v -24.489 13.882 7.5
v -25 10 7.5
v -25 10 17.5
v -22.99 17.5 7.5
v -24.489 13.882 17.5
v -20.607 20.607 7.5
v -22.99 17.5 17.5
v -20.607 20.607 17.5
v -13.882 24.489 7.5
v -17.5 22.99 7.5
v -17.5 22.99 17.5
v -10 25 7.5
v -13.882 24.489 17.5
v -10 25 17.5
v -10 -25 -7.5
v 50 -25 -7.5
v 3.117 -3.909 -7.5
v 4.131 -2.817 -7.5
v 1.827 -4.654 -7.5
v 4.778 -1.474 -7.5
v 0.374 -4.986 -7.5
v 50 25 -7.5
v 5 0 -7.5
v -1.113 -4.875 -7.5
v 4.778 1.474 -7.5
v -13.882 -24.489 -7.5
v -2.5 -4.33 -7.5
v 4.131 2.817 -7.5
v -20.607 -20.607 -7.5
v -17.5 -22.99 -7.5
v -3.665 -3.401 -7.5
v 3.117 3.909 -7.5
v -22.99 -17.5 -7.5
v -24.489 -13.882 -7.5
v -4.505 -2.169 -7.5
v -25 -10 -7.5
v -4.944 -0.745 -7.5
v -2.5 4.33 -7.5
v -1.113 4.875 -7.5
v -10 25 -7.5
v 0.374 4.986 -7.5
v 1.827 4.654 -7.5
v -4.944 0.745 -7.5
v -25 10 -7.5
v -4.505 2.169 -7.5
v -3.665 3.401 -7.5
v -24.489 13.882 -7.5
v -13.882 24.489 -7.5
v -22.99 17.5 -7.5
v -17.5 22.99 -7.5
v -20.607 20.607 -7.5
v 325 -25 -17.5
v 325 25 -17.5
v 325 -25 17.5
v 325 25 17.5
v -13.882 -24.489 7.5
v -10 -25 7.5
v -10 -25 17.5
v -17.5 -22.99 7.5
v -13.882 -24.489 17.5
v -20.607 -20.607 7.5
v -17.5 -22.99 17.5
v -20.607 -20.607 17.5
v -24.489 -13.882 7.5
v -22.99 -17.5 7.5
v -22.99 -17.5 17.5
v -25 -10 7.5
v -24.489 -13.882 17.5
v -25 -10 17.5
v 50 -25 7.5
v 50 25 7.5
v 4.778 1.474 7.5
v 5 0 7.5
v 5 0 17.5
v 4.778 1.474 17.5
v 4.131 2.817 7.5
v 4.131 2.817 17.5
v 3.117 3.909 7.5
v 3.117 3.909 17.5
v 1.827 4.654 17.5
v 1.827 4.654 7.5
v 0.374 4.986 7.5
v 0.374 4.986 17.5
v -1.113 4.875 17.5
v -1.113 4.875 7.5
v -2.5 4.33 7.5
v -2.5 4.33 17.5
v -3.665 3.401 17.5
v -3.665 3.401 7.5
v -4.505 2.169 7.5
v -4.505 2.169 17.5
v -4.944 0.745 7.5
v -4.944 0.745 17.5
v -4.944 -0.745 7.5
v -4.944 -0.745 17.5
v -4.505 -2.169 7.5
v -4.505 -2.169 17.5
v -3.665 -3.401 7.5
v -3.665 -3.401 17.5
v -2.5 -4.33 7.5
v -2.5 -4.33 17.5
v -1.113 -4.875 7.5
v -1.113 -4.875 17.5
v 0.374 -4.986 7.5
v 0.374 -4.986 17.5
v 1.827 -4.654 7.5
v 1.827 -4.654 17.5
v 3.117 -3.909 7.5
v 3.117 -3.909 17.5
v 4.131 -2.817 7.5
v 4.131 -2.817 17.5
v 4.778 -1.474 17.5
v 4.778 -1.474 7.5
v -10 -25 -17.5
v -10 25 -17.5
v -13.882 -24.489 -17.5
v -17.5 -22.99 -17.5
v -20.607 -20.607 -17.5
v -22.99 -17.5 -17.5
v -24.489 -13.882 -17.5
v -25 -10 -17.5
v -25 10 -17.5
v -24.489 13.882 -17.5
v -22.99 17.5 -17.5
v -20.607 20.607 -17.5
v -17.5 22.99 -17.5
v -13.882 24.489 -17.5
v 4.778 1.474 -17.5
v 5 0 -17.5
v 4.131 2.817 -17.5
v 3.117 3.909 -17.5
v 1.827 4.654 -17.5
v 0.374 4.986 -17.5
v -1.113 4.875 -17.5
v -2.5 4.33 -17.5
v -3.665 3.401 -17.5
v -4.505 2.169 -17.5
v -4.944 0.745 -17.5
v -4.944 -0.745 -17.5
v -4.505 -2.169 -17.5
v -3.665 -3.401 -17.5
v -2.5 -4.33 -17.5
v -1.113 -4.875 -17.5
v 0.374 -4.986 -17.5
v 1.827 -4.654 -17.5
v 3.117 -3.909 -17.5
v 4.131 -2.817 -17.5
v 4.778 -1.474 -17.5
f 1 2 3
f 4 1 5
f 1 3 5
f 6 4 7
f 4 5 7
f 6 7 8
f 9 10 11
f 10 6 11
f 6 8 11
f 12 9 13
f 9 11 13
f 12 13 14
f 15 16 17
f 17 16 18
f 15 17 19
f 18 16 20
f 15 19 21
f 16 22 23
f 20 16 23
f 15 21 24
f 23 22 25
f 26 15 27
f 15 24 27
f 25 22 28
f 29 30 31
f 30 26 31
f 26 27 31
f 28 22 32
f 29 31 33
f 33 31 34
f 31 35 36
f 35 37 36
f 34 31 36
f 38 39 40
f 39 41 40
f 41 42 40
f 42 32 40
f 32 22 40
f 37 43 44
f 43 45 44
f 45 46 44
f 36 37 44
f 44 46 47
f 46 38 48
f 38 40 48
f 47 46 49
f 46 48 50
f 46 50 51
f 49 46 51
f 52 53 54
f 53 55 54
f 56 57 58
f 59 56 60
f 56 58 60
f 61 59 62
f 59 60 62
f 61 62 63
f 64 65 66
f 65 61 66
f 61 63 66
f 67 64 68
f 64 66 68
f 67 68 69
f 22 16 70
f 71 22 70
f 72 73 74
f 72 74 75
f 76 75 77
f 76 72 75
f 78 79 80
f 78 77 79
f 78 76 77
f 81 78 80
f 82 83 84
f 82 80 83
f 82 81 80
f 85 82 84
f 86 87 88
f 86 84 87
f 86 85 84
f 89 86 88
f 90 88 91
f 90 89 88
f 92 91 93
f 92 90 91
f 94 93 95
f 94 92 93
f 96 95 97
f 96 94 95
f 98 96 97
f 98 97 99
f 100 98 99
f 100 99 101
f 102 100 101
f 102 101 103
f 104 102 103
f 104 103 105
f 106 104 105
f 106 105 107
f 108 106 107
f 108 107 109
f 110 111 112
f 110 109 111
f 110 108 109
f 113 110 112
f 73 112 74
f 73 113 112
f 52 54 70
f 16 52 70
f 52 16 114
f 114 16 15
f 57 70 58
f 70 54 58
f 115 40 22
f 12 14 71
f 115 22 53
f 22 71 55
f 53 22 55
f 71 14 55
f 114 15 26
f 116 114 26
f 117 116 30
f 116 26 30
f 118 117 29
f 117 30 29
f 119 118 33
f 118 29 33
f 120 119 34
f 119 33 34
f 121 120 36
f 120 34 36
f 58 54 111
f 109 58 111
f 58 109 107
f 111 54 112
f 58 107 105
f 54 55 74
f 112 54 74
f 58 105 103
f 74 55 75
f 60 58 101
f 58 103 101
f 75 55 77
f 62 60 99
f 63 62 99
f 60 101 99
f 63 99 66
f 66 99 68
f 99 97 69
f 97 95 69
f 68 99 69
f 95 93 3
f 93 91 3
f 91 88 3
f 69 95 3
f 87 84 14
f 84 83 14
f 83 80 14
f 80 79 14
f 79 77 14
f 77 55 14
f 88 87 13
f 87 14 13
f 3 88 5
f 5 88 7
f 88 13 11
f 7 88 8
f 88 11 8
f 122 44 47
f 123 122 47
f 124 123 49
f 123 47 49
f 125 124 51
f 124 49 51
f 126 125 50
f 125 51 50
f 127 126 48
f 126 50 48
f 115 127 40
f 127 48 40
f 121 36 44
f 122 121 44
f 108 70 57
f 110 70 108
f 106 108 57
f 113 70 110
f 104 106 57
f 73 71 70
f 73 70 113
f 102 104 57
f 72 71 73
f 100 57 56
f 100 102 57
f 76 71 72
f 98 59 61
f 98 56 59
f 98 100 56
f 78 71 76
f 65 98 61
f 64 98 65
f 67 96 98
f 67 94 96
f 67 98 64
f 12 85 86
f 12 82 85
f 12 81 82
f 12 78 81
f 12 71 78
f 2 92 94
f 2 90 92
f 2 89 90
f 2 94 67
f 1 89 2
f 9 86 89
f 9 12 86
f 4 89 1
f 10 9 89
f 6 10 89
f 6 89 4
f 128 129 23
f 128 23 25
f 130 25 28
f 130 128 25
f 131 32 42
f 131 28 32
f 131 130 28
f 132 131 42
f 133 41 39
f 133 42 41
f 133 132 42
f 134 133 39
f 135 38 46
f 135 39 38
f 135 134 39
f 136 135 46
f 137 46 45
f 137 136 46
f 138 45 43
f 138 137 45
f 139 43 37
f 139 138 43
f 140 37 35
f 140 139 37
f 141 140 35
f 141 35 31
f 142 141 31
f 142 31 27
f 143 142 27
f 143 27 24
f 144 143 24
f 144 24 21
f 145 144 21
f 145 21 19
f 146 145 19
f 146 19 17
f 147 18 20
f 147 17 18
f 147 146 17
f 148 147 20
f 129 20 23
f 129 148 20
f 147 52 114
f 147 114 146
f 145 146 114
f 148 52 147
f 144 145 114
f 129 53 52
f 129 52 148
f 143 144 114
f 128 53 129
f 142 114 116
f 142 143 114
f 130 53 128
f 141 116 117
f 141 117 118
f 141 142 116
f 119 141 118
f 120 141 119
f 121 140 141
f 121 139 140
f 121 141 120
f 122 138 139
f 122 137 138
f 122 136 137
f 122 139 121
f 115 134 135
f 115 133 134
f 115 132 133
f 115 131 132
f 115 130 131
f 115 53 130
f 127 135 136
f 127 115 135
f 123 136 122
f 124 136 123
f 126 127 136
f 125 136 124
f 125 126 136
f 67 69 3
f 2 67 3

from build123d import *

# Parameters (mm, degrees)
EXTRUDE1_DEPTH          = 17.5
SKETCH2_W               = 75
SKETCH2_H               = 15
CUT_EXTRUDE1_DEPTH      = 330.289006801
CUT_EXTRUDE2_DEPTH      = 327.429548295
CUT_EXTRUDE2_DEPTH_BACK = 327.429548295
SKETCH3_R               = 5


with BuildPart() as part:
    # Sketch1 → Extrude1 (new, symmetric)
    with BuildSketch(Plane.XY):
        with BuildLine():
            Line((-10, 25), (325, 25))
            Line((325, 25), (325, -25))
            Line((325, -25), (-10, -25))
            ThreePointArc((-10, -25), (-20.606601718, -20.606601718), (-25, -10))
            Line((-25, -10), (-25, 10))
            ThreePointArc((-25, 10), (-20.606601718, 20.606601718), (-10, 25))
        make_face()
    extrude(amount=EXTRUDE1_DEPTH, both=True)

    # Sketch2 → Cut-Extrude1 (cut, through all)
    with BuildSketch(Plane(origin=(0, 25, 0), x_dir=(-1, 0, 0), z_dir=(0, 1, 0))):
        with Locations((-12.5, 0)):
            Rectangle(SKETCH2_W, SKETCH2_H)
    extrude(amount=-CUT_EXTRUDE1_DEPTH, mode=Mode.SUBTRACT)

    # Sketch3 → Cut-Extrude2 (cut, two sides: drawn at the far end of the back side and taken through both)
    with BuildSketch(Plane.XY.offset(-CUT_EXTRUDE2_DEPTH_BACK)):
        Circle(SKETCH3_R)
    extrude(amount=CUT_EXTRUDE2_DEPTH + CUT_EXTRUDE2_DEPTH_BACK, mode=Mode.SUBTRACT)


solid = part.part
